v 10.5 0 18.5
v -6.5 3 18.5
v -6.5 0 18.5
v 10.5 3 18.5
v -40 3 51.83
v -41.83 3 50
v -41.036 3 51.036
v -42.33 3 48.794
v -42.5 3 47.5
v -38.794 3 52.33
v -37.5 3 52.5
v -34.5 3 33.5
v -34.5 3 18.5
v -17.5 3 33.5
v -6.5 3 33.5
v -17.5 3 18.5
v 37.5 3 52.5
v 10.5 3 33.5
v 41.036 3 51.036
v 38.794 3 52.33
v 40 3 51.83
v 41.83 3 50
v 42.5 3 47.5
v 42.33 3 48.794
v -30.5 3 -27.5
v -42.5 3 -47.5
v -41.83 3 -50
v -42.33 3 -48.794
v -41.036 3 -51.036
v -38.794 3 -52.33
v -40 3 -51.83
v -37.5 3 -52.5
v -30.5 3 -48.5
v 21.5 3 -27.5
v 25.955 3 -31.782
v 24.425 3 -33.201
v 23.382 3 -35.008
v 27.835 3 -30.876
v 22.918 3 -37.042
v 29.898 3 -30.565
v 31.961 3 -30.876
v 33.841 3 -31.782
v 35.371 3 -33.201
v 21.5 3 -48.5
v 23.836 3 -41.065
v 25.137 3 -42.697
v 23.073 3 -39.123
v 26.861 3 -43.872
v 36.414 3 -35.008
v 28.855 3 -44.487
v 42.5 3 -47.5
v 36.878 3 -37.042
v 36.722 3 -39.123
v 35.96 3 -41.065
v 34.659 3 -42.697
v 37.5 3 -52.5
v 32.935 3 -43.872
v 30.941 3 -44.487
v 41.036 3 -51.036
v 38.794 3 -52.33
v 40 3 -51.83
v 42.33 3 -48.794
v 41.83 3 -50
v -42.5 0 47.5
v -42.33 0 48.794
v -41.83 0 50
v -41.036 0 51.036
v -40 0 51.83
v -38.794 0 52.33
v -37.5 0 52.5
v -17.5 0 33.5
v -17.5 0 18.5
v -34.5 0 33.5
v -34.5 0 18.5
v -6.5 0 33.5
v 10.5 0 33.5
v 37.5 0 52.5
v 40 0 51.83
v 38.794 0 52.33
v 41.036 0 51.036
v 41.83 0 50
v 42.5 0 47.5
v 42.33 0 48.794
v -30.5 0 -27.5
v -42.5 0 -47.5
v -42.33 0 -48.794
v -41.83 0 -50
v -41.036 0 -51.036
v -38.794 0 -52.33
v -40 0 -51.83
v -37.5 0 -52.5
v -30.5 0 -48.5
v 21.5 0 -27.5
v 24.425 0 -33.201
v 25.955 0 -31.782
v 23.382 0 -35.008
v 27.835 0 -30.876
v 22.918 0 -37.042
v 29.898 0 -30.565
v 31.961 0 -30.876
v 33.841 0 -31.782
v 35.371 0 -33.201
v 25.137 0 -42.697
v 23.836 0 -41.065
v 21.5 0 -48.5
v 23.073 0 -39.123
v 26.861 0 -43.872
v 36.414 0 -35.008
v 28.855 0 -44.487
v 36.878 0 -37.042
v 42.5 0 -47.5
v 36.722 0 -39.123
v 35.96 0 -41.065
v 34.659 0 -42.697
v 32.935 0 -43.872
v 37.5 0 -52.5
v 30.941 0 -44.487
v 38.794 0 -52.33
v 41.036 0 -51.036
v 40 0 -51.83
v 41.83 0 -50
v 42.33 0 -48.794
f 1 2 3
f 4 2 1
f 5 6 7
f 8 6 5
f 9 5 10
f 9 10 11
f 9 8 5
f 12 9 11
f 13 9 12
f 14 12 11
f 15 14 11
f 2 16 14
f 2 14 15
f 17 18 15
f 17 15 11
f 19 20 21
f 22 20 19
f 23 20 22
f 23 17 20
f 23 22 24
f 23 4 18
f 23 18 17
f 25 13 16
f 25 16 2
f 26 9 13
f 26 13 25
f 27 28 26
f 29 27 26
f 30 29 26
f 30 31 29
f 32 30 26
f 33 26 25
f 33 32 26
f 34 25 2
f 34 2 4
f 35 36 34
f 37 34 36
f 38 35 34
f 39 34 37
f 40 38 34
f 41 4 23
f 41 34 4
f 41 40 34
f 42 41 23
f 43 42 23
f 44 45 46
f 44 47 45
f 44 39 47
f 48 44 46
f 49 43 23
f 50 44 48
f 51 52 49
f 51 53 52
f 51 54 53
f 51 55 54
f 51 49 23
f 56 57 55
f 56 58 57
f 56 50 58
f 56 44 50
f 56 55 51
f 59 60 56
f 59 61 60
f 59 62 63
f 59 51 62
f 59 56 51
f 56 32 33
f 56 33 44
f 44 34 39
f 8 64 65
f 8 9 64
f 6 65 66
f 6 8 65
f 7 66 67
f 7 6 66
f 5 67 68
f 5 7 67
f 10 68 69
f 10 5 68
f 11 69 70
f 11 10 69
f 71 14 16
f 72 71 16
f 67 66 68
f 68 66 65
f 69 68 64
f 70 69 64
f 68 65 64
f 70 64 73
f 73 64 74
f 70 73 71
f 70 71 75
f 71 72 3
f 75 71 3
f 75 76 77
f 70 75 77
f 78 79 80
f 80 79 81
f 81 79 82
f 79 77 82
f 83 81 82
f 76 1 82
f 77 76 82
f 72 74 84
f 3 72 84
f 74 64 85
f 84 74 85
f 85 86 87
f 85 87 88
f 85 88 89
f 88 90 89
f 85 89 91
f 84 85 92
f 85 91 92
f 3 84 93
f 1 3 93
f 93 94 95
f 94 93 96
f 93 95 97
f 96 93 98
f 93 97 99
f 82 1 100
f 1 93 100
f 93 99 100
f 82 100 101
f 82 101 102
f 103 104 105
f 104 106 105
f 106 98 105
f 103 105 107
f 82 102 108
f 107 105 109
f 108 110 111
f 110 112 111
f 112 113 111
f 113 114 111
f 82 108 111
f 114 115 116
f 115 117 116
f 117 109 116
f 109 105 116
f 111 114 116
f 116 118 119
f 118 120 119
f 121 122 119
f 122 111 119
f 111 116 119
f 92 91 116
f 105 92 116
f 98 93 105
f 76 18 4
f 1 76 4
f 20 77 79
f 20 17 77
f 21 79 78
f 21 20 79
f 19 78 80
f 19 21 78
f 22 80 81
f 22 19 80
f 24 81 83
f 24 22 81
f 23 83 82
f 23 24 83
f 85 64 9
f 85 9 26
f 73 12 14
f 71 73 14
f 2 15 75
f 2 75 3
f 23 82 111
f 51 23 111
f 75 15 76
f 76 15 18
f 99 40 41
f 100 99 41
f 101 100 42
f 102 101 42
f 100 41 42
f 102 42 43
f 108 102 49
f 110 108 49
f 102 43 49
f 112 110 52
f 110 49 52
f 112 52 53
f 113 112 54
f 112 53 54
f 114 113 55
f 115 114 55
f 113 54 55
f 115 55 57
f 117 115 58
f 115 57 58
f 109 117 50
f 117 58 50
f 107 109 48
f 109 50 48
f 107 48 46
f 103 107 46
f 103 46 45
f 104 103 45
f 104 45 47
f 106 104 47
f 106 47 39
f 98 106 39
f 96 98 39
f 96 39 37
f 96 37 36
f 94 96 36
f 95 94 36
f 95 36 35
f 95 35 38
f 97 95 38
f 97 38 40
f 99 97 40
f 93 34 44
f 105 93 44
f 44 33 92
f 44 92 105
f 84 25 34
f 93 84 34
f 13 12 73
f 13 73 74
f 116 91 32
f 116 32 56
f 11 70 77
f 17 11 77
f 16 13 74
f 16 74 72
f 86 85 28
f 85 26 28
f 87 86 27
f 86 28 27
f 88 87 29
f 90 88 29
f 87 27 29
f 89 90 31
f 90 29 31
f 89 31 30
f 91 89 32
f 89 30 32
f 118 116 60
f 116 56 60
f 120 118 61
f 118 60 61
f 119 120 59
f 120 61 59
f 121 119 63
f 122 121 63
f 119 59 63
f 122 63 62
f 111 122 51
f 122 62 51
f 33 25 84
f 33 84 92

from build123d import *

# Parameters (mm, degrees)
SKETCH1_W           = 85
SKETCH1_H           = 105
BOSS_EXTRUDE1_DEPTH = 3
SKETCH2_W           = 17
SKETCH2_H           = 15
CUT_EXTRUDE1_DEPTH  = 10
FILLET1_R           = 5
SKETCH3_W           = 52
SKETCH3_H           = 21
CUT_EXTRUDE2_DEPTH  = 10
SKETCH4_R           = 7
CUT_EXTRUDE3_DEPTH  = 10


with BuildPart() as part:
    # Sketch1 → Boss-Extrude1 (new body)
    with BuildSketch(Plane(origin=(0, 0, 0), x_dir=(1, 0, 0), z_dir=(0, 1, 0))):
        Rectangle(SKETCH1_W, SKETCH1_H)
    extrude(amount=BOSS_EXTRUDE1_DEPTH)

    # Sketch2 → Cut-Extrude1 (cut)
    with BuildSketch(Plane(origin=(0, 3, 0), x_dir=(1, 0, 0), z_dir=(0, 1, 0))):
        with Locations((-26, -26)):
            Rectangle(SKETCH2_W, SKETCH2_H)
        with Locations((2, -26)):
            Rectangle(SKETCH2_W, SKETCH2_H)
    extrude(amount=-CUT_EXTRUDE1_DEPTH, mode=Mode.SUBTRACT)

    # Fillet1
    fillet1_edges = [part.edges().sort_by_distance(p)[0] for p in [
        (42.5, 1.5, 52.5),
        (-42.5, 1.5, 52.5),
        (-42.5, 1.5, -52.5),
        (42.5, 1.5, -52.5),
    ]]
    fillet(fillet1_edges, radius=FILLET1_R)

    # Sketch3 → Cut-Extrude2 (cut)
    with BuildSketch(Plane(origin=(0, 3, 0), x_dir=(1, 0, 0), z_dir=(0, 1, 0))):
        with Locations((-4.5, 38)):
            Rectangle(SKETCH3_W, SKETCH3_H)
    extrude(amount=-CUT_EXTRUDE2_DEPTH, mode=Mode.SUBTRACT)

    # Sketch4 → Cut-Extrude3 (cut)
    with BuildSketch(Plane(origin=(0, 3, 0), x_dir=(1, 0, 0), z_dir=(0, 1, 0))):
        with Locations(Location((29.897939867, 37.565399996, 0), (0, 0, 270))):
            Circle(SKETCH4_R)
    extrude(amount=-CUT_EXTRUDE3_DEPTH, mode=Mode.SUBTRACT)


solid = part.part
